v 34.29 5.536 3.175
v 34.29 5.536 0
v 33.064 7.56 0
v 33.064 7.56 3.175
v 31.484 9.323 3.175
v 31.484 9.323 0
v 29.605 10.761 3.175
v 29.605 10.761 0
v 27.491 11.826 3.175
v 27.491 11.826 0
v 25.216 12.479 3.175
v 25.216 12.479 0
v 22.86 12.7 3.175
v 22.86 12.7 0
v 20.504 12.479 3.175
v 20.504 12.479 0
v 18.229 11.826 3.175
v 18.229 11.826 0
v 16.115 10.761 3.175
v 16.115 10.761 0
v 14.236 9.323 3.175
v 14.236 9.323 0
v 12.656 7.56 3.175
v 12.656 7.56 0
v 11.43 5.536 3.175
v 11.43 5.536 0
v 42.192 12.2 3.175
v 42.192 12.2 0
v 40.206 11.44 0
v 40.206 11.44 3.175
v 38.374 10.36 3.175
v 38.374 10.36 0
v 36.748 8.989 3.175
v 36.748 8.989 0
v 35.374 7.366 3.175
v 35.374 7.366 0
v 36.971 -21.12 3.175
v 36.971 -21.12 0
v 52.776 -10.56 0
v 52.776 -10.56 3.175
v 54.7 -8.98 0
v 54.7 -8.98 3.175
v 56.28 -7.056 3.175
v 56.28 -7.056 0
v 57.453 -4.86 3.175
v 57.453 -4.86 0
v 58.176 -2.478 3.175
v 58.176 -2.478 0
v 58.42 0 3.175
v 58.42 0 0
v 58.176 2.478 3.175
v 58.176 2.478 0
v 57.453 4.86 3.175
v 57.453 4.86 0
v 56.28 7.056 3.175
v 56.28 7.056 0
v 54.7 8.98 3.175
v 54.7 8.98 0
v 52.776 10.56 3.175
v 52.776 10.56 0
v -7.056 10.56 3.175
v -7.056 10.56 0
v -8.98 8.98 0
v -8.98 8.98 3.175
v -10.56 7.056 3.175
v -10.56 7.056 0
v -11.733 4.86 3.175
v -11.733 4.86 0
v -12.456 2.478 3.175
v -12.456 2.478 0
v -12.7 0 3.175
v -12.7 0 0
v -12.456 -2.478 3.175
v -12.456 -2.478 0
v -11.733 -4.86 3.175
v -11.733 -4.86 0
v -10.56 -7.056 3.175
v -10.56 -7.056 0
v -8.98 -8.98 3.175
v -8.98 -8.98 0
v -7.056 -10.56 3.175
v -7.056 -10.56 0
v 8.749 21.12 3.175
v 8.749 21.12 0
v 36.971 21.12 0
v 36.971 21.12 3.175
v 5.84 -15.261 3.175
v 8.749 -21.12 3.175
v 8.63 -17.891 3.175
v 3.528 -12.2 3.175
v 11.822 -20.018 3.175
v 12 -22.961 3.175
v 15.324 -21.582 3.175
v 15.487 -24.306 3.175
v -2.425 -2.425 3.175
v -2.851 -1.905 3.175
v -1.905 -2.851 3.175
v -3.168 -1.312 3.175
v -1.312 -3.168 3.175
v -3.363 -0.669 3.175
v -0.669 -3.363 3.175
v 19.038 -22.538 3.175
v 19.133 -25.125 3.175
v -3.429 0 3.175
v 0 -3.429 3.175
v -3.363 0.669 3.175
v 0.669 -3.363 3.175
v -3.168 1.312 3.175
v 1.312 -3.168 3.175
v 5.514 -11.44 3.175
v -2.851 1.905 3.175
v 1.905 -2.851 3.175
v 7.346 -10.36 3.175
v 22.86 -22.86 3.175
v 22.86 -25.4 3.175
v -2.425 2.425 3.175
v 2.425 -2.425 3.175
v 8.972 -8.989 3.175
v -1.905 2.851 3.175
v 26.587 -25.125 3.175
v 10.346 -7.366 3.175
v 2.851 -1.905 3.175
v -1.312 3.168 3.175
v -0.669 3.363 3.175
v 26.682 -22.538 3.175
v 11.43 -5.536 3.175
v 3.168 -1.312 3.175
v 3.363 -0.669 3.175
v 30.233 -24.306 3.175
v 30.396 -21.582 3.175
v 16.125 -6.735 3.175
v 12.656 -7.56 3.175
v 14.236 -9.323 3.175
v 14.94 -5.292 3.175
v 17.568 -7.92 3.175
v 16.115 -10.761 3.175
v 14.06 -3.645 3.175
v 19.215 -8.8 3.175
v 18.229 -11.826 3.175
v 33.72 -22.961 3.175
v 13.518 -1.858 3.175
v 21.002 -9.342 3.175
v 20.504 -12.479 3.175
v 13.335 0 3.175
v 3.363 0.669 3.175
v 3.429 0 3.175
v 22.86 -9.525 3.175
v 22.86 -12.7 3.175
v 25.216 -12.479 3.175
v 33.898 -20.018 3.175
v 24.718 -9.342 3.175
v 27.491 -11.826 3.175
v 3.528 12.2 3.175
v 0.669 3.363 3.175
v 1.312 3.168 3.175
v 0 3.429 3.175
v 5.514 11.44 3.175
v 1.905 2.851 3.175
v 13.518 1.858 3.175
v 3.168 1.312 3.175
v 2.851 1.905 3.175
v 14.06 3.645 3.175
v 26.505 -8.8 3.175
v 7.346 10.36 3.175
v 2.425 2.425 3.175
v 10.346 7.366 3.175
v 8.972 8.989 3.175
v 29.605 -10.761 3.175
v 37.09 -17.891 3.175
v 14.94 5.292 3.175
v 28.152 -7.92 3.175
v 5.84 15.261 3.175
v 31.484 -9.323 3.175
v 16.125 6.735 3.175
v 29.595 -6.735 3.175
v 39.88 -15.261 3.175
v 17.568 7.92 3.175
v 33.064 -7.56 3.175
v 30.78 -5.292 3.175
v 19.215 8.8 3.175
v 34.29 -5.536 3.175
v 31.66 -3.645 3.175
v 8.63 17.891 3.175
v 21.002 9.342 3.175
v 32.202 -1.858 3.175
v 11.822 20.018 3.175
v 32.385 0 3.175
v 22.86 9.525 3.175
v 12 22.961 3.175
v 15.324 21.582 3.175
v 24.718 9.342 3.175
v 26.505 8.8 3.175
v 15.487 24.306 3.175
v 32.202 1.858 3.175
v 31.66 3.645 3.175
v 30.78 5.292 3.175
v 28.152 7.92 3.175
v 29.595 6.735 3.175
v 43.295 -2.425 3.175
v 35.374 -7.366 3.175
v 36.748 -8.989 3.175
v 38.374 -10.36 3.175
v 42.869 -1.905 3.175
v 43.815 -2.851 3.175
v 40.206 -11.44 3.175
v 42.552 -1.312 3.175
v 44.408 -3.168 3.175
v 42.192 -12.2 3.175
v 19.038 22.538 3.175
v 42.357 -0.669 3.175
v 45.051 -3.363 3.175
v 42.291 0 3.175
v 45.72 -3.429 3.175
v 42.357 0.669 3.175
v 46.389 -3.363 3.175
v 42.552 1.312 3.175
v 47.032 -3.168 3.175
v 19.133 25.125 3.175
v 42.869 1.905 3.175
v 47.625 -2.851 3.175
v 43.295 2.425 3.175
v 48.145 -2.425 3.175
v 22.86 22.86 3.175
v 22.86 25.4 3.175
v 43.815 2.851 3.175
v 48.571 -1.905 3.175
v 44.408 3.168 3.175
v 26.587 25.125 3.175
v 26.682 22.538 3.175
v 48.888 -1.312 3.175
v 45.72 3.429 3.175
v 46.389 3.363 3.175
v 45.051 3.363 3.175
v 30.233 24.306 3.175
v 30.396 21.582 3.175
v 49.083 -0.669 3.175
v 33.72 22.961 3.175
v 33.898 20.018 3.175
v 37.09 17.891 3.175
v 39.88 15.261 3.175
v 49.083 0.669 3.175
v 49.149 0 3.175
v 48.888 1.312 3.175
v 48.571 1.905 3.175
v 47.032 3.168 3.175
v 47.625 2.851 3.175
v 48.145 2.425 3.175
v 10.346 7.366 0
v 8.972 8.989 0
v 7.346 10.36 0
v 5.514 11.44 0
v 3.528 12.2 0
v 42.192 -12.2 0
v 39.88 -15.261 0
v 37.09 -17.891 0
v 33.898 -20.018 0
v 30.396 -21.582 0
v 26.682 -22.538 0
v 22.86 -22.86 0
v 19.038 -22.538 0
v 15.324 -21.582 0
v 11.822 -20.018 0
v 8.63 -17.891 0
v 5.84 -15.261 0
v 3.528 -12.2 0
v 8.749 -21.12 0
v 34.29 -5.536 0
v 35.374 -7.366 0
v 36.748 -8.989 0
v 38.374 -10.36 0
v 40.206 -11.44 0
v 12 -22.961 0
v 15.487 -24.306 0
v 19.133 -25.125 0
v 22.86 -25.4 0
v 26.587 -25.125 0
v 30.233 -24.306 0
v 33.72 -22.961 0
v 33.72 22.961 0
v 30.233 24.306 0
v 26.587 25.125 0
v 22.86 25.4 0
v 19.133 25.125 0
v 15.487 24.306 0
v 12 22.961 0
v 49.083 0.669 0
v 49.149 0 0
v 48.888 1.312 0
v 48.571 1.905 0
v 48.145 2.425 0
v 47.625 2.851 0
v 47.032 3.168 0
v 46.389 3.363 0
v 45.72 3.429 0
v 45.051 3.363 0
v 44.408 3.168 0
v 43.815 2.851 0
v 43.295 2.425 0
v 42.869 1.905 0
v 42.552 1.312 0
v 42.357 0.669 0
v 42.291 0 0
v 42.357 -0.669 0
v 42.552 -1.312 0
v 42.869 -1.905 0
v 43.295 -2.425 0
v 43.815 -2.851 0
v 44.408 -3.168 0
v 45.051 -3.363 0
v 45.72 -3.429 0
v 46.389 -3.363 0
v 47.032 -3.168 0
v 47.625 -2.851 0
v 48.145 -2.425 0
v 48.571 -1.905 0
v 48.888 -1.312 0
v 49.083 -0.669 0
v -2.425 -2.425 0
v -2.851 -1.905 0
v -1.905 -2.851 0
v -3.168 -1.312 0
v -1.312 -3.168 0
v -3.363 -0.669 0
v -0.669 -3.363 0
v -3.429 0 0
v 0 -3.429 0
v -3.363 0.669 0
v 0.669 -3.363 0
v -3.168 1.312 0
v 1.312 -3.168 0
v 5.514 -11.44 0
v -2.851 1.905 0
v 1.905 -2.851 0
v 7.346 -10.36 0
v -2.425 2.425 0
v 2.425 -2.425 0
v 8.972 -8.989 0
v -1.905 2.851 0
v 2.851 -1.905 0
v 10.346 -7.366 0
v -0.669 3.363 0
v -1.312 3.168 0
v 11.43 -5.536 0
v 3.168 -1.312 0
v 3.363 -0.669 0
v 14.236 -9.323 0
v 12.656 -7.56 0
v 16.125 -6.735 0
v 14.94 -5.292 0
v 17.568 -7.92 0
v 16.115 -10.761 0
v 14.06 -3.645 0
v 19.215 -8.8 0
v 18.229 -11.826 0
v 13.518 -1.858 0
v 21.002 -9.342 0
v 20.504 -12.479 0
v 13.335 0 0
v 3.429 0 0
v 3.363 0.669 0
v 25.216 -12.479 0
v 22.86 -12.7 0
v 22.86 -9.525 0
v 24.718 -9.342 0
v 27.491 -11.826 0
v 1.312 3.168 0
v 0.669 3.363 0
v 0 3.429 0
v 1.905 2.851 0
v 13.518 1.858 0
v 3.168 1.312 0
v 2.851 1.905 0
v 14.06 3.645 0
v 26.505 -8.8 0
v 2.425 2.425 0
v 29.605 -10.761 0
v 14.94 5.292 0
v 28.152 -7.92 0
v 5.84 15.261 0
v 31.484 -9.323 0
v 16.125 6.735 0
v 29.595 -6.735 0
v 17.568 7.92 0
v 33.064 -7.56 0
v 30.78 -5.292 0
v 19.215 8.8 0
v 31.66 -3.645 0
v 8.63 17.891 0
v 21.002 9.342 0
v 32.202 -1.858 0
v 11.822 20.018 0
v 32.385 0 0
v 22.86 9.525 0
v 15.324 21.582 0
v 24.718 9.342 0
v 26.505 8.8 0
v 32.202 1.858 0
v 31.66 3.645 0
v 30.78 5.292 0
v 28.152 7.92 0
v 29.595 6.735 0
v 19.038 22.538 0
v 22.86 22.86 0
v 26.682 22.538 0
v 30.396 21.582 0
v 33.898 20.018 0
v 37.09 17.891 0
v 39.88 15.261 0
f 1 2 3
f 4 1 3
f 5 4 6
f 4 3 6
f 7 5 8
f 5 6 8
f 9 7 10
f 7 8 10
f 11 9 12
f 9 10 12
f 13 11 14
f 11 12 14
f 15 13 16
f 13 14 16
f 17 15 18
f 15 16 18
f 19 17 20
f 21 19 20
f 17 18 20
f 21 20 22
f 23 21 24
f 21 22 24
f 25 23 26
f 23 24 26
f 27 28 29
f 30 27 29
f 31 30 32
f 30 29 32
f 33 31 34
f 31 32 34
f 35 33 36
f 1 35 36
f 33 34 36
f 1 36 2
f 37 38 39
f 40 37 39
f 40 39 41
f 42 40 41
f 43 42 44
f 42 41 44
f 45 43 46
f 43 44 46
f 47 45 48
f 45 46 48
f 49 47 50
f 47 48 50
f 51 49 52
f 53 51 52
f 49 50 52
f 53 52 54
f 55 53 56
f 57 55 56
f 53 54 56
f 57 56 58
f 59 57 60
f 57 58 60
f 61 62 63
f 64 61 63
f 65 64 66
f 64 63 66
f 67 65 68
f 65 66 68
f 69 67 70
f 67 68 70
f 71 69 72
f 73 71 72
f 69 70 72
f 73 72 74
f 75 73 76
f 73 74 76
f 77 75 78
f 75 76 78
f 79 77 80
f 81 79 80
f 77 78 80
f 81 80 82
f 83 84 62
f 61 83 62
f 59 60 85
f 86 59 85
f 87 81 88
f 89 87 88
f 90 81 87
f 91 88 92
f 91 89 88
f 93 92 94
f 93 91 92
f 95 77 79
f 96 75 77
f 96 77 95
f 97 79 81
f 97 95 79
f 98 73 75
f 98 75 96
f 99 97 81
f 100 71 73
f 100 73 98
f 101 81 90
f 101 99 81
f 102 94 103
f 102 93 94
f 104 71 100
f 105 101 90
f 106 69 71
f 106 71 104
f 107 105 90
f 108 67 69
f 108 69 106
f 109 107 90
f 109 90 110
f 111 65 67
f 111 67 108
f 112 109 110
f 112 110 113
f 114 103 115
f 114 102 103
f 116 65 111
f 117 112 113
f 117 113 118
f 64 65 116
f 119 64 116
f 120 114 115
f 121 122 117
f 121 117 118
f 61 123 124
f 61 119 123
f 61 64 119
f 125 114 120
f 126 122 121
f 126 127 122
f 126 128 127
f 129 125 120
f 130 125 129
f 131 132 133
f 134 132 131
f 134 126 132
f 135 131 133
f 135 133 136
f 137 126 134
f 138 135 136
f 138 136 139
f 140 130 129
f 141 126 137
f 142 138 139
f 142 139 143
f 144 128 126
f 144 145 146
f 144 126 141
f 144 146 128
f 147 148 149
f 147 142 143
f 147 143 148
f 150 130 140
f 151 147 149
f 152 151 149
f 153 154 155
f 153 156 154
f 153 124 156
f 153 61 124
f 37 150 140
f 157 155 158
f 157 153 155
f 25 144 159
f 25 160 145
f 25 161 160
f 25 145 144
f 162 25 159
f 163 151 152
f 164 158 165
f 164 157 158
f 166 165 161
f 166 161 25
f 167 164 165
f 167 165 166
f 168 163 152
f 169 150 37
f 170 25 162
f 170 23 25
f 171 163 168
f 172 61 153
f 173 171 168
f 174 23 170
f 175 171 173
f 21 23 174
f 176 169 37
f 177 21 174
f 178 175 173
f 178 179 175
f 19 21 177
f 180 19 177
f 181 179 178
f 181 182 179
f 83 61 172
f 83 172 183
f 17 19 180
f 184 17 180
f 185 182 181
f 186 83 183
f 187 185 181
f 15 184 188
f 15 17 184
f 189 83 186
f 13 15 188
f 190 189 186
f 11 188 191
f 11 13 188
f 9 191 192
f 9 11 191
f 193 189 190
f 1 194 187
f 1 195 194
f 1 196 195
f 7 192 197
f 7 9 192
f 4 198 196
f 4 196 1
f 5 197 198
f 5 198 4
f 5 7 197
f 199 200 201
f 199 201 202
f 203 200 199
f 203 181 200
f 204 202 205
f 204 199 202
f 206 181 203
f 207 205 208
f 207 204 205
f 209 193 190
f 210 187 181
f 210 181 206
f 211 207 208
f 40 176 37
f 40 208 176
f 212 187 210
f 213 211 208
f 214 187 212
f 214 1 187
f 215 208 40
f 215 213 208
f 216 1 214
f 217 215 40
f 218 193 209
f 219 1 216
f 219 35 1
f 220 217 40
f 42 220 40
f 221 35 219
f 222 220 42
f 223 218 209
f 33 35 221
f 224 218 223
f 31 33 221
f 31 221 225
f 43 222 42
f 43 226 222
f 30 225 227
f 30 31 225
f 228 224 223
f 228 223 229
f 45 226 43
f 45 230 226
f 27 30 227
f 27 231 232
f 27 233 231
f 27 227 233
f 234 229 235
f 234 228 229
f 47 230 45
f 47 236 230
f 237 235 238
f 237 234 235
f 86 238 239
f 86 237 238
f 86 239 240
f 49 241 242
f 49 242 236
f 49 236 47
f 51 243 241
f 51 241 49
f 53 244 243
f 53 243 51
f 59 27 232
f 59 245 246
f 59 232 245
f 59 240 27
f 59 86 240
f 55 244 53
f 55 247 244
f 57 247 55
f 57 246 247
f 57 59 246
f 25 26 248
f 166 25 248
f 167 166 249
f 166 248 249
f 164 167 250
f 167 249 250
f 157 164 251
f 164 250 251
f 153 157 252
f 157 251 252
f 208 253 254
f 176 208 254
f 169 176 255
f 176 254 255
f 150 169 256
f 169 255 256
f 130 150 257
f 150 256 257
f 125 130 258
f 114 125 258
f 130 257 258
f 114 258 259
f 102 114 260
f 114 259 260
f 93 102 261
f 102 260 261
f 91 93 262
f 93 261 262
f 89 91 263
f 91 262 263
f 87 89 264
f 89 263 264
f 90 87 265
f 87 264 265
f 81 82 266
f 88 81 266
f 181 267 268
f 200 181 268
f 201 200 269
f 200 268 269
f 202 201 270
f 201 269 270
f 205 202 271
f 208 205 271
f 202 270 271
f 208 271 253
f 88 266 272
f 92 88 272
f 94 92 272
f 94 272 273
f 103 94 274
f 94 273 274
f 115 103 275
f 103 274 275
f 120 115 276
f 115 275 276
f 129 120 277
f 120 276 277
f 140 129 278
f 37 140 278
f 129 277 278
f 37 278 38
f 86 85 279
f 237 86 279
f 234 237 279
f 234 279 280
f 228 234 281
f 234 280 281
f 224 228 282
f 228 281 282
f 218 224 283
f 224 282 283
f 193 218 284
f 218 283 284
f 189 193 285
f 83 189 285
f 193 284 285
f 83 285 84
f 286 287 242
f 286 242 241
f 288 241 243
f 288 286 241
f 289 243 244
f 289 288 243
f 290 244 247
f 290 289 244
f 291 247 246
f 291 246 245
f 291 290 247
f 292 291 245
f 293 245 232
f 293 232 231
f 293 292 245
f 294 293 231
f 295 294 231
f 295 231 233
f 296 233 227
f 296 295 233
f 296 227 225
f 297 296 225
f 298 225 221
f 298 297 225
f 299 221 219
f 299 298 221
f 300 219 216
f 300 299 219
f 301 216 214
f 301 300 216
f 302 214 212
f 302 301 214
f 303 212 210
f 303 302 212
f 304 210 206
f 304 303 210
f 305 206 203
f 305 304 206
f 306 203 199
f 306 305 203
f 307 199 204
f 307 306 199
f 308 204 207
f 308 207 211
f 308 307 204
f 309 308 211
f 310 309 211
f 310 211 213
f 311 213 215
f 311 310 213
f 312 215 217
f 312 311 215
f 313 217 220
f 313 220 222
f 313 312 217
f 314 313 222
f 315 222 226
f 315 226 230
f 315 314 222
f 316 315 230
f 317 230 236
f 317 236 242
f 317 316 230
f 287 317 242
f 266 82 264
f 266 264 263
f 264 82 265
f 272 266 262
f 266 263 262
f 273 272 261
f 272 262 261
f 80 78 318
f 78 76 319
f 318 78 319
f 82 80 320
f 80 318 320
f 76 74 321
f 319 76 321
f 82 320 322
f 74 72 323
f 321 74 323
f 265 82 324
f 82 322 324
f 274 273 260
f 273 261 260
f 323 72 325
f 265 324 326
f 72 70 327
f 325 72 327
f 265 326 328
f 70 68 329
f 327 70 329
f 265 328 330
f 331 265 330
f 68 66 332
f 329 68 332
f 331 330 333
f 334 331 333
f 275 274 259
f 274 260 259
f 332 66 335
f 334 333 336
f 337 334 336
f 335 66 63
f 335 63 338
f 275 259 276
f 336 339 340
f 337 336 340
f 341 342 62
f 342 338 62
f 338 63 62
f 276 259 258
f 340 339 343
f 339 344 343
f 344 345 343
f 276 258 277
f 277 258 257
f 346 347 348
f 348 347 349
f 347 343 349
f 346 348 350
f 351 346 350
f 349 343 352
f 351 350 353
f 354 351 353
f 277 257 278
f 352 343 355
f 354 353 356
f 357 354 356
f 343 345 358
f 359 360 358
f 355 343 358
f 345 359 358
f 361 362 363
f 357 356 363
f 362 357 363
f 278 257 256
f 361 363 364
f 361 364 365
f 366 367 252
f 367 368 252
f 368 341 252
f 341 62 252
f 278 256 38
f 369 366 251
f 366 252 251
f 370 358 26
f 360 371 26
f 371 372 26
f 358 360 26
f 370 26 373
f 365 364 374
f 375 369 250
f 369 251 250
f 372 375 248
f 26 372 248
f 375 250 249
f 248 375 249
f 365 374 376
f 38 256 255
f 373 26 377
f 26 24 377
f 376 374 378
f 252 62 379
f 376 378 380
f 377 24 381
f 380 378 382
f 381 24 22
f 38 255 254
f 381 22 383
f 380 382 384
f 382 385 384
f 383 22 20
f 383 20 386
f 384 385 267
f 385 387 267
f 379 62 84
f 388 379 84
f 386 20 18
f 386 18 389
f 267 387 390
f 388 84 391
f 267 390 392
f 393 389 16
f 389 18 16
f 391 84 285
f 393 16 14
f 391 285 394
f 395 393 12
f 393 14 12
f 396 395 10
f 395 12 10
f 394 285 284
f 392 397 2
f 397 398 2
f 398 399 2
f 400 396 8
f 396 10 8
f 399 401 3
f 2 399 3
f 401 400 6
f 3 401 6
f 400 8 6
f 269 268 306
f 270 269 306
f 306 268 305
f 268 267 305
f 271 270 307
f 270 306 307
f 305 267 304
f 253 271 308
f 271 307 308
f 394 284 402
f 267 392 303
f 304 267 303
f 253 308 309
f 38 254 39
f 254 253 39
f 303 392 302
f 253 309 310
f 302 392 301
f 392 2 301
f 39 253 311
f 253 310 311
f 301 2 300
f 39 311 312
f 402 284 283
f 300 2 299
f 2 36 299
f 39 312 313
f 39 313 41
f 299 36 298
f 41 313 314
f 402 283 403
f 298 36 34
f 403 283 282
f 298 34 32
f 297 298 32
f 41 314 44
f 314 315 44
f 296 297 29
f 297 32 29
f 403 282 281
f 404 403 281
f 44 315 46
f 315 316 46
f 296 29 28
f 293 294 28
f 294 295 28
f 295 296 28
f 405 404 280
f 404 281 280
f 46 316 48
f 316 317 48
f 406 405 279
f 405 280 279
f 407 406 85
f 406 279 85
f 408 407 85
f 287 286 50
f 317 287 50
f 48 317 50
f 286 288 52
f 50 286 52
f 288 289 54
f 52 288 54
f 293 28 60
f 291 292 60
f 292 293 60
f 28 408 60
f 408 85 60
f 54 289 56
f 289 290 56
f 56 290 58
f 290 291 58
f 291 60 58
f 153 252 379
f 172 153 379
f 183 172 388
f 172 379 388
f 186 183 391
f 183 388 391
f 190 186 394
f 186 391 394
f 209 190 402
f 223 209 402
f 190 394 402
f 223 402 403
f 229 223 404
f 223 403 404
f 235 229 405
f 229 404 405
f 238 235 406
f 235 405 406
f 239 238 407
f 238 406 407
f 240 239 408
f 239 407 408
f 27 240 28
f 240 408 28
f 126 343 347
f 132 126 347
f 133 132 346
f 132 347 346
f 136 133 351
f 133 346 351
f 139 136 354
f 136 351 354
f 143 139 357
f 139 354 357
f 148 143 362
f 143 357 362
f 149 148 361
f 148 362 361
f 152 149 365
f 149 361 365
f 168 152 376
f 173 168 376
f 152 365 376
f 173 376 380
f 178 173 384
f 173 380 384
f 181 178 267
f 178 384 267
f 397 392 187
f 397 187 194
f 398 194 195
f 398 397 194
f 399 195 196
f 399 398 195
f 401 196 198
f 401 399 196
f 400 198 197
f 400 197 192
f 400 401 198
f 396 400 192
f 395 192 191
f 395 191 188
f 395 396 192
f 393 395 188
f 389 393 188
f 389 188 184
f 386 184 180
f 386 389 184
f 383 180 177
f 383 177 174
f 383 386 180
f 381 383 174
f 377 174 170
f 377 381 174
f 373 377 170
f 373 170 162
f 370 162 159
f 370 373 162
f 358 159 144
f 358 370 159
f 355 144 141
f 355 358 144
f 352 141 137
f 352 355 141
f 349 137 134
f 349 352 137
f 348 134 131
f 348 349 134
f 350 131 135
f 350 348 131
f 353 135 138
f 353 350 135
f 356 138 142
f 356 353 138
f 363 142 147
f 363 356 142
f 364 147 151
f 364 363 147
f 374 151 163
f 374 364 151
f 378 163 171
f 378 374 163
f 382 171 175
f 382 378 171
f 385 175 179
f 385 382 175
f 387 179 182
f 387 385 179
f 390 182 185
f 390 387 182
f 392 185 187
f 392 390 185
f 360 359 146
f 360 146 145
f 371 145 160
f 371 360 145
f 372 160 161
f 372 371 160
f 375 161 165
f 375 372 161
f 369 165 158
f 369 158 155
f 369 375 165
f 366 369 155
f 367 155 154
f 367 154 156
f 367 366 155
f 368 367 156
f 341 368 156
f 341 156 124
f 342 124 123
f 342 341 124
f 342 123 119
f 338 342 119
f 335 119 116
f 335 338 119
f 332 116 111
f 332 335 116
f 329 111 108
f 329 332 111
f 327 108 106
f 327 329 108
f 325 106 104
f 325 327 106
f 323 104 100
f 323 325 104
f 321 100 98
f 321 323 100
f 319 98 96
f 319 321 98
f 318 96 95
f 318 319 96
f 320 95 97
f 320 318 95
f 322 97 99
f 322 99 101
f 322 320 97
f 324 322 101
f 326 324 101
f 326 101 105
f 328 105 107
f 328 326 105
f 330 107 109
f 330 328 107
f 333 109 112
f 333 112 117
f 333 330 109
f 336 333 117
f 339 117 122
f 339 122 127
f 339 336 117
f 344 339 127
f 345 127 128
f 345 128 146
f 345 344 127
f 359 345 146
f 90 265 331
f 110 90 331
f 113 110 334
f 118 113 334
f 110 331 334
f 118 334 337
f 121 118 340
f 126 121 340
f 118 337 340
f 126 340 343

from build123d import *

# Parameters (mm, degrees)
F0_R     = 3.429
F0_R_2   = 9.525
F1_DEPTH = 3.175


with BuildPart() as f1:
    # F0 (on Top) → F1 (new body)
    with BuildSketch(Plane.XY):
        with BuildLine():
            Line((8.748889, 21.119577), (-7.055556, 10.559789))
            ThreePointArc((-7.055556, 10.559789), (-12.7, 0), (-7.055556, -10.559789))
            Line((-7.055556, -10.559789), (8.748889, -21.119577))
            ThreePointArc((8.748889, -21.119577), (22.86, -25.4), (36.971111, -21.119577))
            Line((36.971111, -21.119577), (52.775556, -10.559789))
            ThreePointArc((52.775556, -10.559789), (58.42, 0), (52.775556, 10.559789))
            Line((52.775556, 10.559789), (36.971111, 21.119577))
            ThreePointArc((36.971111, 21.119577), (22.86, 25.4), (8.748889, 21.119577))
        make_face()
        with BuildLine():
            ThreePointArc((42.192222, -12.200196), (22.86, -22.86), (3.527778, -12.200196))
            ThreePointArc((3.527778, -12.200196), (8.187632, -9.708382), (11.43, -5.535802))
            ThreePointArc((11.43, -5.535802), (22.86, -12.7), (34.29, -5.535802))
            ThreePointArc((34.29, -5.535802), (37.532368, -9.708382), (42.192222, -12.200196))
        make_face(mode=Mode.SUBTRACT)
        Circle(F0_R, mode=Mode.SUBTRACT)
        with Locations((22.86, 0)):
            Circle(F0_R_2, mode=Mode.SUBTRACT)
        with Locations((45.72, 0)):
            Circle(F0_R, mode=Mode.SUBTRACT)
        with BuildLine():
            ThreePointArc((42.192222, 12.200196), (37.532368, 9.708382), (34.29, 5.535802))
            ThreePointArc((34.29, 5.535802), (22.86, 12.7), (11.43, 5.535802))
            ThreePointArc((11.43, 5.535802), (8.187632, 9.708382), (3.527778, 12.200196))
            ThreePointArc((3.527778, 12.200196), (22.86, 22.86), (42.192222, 12.200196))
        make_face(mode=Mode.SUBTRACT)
    extrude(amount=F1_DEPTH)


solid = f1.part
